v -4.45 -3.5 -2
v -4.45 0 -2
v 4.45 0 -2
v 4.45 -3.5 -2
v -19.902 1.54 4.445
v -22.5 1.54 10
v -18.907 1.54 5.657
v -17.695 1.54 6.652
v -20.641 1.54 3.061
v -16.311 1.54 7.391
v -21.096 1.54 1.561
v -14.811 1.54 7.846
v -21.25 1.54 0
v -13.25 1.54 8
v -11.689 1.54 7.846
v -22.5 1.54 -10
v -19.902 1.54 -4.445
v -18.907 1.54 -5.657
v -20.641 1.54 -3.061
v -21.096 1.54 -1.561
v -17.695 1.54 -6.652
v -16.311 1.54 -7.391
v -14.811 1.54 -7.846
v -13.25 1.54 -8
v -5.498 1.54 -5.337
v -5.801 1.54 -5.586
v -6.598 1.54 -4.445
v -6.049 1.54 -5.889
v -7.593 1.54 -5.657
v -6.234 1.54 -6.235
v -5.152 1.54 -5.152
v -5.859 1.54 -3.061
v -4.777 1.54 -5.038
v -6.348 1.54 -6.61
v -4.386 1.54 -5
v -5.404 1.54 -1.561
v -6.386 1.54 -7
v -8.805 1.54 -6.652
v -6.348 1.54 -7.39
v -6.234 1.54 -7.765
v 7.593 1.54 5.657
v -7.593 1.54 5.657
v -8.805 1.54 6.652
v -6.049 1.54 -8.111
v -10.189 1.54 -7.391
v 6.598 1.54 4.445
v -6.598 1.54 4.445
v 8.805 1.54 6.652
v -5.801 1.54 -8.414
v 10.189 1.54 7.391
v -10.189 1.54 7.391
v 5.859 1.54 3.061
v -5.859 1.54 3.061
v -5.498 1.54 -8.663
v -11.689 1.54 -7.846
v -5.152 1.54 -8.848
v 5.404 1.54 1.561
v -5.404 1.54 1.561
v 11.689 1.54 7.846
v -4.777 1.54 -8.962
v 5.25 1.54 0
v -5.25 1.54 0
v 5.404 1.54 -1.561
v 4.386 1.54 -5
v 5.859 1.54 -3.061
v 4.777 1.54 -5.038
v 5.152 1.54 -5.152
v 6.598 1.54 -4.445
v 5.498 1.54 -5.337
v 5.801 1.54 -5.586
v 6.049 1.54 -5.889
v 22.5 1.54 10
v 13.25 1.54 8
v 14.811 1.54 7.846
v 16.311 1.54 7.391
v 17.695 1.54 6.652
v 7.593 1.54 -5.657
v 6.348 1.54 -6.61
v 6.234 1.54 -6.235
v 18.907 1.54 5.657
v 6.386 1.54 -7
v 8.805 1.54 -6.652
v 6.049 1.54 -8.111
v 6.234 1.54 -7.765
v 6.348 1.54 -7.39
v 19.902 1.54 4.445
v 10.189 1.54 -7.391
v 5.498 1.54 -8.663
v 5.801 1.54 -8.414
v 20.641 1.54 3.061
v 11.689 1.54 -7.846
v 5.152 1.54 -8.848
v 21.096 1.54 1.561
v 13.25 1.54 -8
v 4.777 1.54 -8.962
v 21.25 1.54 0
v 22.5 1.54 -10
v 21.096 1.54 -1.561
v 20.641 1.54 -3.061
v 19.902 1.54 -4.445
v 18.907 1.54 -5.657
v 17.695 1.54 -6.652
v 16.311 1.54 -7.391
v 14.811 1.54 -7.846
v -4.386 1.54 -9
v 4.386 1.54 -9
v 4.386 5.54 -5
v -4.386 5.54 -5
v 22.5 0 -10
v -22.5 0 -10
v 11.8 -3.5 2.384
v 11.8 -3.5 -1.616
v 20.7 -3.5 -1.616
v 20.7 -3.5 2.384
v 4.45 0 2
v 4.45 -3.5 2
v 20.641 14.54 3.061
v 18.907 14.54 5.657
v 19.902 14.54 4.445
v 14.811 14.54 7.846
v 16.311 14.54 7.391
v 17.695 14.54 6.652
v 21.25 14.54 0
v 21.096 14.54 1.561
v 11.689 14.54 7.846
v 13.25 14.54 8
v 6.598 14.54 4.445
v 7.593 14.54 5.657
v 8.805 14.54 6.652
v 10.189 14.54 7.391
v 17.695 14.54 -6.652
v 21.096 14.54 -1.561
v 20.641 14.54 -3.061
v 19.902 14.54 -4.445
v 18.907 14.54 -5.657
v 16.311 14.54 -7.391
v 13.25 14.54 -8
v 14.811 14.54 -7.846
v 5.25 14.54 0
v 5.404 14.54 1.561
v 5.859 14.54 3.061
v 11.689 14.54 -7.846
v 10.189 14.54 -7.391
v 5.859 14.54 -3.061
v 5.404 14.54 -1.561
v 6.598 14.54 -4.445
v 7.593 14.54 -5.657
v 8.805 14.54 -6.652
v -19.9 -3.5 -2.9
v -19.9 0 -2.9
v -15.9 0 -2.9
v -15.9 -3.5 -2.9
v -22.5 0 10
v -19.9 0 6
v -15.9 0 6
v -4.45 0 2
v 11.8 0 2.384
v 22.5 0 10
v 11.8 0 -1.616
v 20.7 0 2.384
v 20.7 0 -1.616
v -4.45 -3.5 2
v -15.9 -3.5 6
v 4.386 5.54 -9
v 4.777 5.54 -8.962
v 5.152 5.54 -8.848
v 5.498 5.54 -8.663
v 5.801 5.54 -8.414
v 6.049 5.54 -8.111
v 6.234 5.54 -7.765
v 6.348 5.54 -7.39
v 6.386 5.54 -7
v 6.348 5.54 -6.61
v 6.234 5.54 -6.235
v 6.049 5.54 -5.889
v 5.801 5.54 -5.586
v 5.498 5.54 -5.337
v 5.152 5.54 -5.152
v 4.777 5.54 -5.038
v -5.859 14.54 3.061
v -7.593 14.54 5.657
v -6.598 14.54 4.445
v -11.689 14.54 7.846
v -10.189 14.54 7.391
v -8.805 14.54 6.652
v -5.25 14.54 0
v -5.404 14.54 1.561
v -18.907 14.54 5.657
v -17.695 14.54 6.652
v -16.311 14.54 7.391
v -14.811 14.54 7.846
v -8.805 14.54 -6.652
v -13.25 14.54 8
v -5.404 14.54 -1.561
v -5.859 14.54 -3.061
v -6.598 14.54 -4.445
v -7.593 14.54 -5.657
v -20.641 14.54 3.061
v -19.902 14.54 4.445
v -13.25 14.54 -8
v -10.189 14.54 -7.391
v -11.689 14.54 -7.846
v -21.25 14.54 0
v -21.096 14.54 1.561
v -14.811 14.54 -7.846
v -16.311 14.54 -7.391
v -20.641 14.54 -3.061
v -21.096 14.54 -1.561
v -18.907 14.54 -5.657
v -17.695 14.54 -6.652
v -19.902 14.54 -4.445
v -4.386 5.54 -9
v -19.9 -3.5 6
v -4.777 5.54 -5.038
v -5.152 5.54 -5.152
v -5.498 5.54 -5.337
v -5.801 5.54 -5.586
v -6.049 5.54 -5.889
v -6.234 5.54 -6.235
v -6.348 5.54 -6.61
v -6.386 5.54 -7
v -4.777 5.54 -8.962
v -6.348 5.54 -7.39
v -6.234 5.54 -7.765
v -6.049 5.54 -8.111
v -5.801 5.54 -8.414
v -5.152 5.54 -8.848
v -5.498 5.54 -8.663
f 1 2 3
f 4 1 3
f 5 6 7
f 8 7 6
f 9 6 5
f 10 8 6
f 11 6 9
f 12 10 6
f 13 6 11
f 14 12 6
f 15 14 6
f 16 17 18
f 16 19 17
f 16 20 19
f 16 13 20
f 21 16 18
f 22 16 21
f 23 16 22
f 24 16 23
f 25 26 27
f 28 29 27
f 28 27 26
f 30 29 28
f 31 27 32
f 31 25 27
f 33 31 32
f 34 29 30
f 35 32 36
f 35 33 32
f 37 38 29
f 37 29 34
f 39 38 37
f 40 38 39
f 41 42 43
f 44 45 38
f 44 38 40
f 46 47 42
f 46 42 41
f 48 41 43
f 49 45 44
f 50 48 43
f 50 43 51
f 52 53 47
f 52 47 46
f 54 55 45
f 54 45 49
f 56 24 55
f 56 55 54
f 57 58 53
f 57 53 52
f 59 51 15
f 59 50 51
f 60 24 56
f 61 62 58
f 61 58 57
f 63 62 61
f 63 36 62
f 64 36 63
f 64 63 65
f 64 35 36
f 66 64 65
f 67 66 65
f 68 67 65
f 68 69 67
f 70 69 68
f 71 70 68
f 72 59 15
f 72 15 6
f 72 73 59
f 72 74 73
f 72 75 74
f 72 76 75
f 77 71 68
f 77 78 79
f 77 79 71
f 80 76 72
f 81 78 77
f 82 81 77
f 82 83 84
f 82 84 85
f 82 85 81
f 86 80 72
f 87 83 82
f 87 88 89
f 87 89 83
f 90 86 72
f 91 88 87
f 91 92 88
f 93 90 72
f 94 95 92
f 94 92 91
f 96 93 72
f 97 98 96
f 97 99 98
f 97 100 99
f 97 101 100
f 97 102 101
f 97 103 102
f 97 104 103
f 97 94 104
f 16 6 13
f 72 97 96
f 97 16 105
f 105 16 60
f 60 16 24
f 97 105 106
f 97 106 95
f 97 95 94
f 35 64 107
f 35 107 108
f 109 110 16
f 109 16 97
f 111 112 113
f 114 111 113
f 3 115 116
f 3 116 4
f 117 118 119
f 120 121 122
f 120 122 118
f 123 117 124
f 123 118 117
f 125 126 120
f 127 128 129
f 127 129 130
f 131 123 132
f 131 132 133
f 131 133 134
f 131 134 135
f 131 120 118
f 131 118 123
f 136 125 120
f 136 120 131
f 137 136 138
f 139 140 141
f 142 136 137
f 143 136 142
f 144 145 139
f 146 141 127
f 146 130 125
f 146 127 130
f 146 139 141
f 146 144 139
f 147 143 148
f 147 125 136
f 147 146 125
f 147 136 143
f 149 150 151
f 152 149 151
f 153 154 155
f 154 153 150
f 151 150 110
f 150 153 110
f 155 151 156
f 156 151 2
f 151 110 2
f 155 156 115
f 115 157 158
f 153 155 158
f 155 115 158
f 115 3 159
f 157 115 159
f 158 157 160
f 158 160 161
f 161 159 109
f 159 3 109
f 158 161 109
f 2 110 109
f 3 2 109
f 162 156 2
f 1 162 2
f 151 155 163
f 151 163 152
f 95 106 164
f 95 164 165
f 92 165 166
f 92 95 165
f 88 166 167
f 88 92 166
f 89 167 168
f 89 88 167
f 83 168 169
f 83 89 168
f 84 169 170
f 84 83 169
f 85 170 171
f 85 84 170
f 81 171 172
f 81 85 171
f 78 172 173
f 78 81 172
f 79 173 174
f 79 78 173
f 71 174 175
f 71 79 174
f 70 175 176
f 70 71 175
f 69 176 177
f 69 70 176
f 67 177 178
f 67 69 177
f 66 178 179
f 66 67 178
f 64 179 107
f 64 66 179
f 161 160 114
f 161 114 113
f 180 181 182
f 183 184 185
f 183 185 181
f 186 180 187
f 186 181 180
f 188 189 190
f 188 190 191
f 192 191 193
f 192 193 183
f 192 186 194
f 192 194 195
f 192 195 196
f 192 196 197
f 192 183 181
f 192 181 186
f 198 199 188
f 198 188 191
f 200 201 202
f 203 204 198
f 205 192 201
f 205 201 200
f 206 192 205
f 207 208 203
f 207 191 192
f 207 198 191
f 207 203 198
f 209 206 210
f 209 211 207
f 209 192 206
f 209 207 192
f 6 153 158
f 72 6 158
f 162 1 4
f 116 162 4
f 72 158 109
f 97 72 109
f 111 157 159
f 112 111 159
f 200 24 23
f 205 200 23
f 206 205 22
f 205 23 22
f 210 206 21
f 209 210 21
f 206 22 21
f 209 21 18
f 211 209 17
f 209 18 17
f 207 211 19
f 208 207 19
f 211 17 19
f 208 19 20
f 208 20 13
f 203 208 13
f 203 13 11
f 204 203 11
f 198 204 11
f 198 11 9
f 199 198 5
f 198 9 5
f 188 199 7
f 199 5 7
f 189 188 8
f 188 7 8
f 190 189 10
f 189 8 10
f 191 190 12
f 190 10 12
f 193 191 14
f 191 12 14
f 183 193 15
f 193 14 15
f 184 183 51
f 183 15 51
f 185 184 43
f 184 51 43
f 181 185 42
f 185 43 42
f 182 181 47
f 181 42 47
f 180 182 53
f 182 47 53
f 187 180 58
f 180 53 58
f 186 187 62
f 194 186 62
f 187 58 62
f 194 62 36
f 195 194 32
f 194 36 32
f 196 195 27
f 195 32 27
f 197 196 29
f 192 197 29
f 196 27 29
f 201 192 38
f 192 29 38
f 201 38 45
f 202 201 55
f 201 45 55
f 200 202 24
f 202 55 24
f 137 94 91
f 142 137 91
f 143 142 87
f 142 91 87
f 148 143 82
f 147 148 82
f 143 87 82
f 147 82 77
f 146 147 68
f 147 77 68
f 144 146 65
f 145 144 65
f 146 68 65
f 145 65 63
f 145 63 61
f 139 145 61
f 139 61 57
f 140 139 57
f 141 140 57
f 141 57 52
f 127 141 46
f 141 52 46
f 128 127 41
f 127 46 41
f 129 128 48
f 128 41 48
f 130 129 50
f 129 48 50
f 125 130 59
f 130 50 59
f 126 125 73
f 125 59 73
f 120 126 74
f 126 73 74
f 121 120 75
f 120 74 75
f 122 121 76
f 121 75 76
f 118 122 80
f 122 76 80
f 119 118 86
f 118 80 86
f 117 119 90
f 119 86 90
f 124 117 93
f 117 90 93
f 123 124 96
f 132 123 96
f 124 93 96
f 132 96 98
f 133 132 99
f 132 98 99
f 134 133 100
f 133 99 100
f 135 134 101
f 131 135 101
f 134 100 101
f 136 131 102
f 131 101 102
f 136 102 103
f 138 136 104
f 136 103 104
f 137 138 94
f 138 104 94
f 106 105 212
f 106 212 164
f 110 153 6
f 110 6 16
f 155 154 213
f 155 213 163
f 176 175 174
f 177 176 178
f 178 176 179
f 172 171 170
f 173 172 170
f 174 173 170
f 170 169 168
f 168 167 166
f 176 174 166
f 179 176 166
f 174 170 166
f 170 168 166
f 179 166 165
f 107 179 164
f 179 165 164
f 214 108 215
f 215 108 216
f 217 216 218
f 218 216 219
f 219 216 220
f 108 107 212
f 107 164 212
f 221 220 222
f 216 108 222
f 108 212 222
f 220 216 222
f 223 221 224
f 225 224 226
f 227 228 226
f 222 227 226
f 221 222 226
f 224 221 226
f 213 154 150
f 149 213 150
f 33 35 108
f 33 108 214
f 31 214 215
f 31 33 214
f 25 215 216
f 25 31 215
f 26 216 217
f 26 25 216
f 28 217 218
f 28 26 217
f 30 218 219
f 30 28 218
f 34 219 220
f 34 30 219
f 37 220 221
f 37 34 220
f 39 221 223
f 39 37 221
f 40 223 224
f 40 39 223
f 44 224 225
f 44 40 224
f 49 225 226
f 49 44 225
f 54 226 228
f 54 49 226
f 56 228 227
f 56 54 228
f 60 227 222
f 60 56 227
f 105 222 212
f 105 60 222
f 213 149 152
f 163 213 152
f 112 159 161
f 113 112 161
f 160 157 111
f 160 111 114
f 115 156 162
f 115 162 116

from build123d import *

# Parameters (mm, degrees)
SKETCH1_W           = 45
SKETCH1_H           = 20
BOSS_EXTRUDE1_DEPTH = 1.54
SKETCH2_R           = 8
BOSS_EXTRUDE2_DEPTH = 13
BOSS_EXTRUDE3_DEPTH = 4
SKETCH4_W           = 8.9
SKETCH4_H           = 4
SKETCH4_W_2         = 4
SKETCH4_H_2         = 8.9
BOSS_EXTRUDE4_DEPTH = 3.5


with BuildPart() as part:
    # Sketch1 → Boss-Extrude1 (new body)
    with BuildSketch(Plane(origin=(0, 0, 0), x_dir=(1, 0, 0), z_dir=(0, 1, 0))):
        Rectangle(SKETCH1_W, SKETCH1_H)
    extrude(amount=BOSS_EXTRUDE1_DEPTH)

    # Sketch2 → Boss-Extrude2 (add)
    with BuildSketch(Plane(origin=(0, 1.54, 0), x_dir=(1, 0, 0), z_dir=(0, 1, 0))):
        with Locations(Location((-13.25, 0, 0), (0, 0, 90))):
            Circle(SKETCH2_R)
        with Locations(Location((13.25, 0, 0), (0, 0, 90))):
            Circle(SKETCH2_R)
    extrude(amount=BOSS_EXTRUDE2_DEPTH)

    # Sketch3 → Boss-Extrude3 (add)
    with BuildSketch(Plane(origin=(0, 1.54, 0), x_dir=(1, 0, 0), z_dir=(0, 1, 0))):
        with BuildLine():
            Line((-4.3864516, 9), (4.3864516, 9))
            ThreePointArc((4.3864516, 9), (6.3864516, 7), (4.3864516, 5))
            Line((4.3864516, 5), (-4.3864516, 5))
            ThreePointArc((-4.3864516, 5), (-6.3864516, 7), (-4.3864516, 9))
        make_face()
    extrude(amount=BOSS_EXTRUDE3_DEPTH)

    # Sketch4 → Boss-Extrude4 (add)
    with BuildSketch(Plane(origin=(0, 0, 0), x_dir=(1, 0, 0), z_dir=(0, 1, 0))):
        Rectangle(SKETCH4_W, SKETCH4_H)
        with Locations((16.25, -0.384163824)):
            Rectangle(SKETCH4_W, SKETCH4_H)
        with Locations((-17.9, -1.55)):
            Rectangle(SKETCH4_W_2, SKETCH4_H_2)
    extrude(amount=-BOSS_EXTRUDE4_DEPTH)


solid = part.part
